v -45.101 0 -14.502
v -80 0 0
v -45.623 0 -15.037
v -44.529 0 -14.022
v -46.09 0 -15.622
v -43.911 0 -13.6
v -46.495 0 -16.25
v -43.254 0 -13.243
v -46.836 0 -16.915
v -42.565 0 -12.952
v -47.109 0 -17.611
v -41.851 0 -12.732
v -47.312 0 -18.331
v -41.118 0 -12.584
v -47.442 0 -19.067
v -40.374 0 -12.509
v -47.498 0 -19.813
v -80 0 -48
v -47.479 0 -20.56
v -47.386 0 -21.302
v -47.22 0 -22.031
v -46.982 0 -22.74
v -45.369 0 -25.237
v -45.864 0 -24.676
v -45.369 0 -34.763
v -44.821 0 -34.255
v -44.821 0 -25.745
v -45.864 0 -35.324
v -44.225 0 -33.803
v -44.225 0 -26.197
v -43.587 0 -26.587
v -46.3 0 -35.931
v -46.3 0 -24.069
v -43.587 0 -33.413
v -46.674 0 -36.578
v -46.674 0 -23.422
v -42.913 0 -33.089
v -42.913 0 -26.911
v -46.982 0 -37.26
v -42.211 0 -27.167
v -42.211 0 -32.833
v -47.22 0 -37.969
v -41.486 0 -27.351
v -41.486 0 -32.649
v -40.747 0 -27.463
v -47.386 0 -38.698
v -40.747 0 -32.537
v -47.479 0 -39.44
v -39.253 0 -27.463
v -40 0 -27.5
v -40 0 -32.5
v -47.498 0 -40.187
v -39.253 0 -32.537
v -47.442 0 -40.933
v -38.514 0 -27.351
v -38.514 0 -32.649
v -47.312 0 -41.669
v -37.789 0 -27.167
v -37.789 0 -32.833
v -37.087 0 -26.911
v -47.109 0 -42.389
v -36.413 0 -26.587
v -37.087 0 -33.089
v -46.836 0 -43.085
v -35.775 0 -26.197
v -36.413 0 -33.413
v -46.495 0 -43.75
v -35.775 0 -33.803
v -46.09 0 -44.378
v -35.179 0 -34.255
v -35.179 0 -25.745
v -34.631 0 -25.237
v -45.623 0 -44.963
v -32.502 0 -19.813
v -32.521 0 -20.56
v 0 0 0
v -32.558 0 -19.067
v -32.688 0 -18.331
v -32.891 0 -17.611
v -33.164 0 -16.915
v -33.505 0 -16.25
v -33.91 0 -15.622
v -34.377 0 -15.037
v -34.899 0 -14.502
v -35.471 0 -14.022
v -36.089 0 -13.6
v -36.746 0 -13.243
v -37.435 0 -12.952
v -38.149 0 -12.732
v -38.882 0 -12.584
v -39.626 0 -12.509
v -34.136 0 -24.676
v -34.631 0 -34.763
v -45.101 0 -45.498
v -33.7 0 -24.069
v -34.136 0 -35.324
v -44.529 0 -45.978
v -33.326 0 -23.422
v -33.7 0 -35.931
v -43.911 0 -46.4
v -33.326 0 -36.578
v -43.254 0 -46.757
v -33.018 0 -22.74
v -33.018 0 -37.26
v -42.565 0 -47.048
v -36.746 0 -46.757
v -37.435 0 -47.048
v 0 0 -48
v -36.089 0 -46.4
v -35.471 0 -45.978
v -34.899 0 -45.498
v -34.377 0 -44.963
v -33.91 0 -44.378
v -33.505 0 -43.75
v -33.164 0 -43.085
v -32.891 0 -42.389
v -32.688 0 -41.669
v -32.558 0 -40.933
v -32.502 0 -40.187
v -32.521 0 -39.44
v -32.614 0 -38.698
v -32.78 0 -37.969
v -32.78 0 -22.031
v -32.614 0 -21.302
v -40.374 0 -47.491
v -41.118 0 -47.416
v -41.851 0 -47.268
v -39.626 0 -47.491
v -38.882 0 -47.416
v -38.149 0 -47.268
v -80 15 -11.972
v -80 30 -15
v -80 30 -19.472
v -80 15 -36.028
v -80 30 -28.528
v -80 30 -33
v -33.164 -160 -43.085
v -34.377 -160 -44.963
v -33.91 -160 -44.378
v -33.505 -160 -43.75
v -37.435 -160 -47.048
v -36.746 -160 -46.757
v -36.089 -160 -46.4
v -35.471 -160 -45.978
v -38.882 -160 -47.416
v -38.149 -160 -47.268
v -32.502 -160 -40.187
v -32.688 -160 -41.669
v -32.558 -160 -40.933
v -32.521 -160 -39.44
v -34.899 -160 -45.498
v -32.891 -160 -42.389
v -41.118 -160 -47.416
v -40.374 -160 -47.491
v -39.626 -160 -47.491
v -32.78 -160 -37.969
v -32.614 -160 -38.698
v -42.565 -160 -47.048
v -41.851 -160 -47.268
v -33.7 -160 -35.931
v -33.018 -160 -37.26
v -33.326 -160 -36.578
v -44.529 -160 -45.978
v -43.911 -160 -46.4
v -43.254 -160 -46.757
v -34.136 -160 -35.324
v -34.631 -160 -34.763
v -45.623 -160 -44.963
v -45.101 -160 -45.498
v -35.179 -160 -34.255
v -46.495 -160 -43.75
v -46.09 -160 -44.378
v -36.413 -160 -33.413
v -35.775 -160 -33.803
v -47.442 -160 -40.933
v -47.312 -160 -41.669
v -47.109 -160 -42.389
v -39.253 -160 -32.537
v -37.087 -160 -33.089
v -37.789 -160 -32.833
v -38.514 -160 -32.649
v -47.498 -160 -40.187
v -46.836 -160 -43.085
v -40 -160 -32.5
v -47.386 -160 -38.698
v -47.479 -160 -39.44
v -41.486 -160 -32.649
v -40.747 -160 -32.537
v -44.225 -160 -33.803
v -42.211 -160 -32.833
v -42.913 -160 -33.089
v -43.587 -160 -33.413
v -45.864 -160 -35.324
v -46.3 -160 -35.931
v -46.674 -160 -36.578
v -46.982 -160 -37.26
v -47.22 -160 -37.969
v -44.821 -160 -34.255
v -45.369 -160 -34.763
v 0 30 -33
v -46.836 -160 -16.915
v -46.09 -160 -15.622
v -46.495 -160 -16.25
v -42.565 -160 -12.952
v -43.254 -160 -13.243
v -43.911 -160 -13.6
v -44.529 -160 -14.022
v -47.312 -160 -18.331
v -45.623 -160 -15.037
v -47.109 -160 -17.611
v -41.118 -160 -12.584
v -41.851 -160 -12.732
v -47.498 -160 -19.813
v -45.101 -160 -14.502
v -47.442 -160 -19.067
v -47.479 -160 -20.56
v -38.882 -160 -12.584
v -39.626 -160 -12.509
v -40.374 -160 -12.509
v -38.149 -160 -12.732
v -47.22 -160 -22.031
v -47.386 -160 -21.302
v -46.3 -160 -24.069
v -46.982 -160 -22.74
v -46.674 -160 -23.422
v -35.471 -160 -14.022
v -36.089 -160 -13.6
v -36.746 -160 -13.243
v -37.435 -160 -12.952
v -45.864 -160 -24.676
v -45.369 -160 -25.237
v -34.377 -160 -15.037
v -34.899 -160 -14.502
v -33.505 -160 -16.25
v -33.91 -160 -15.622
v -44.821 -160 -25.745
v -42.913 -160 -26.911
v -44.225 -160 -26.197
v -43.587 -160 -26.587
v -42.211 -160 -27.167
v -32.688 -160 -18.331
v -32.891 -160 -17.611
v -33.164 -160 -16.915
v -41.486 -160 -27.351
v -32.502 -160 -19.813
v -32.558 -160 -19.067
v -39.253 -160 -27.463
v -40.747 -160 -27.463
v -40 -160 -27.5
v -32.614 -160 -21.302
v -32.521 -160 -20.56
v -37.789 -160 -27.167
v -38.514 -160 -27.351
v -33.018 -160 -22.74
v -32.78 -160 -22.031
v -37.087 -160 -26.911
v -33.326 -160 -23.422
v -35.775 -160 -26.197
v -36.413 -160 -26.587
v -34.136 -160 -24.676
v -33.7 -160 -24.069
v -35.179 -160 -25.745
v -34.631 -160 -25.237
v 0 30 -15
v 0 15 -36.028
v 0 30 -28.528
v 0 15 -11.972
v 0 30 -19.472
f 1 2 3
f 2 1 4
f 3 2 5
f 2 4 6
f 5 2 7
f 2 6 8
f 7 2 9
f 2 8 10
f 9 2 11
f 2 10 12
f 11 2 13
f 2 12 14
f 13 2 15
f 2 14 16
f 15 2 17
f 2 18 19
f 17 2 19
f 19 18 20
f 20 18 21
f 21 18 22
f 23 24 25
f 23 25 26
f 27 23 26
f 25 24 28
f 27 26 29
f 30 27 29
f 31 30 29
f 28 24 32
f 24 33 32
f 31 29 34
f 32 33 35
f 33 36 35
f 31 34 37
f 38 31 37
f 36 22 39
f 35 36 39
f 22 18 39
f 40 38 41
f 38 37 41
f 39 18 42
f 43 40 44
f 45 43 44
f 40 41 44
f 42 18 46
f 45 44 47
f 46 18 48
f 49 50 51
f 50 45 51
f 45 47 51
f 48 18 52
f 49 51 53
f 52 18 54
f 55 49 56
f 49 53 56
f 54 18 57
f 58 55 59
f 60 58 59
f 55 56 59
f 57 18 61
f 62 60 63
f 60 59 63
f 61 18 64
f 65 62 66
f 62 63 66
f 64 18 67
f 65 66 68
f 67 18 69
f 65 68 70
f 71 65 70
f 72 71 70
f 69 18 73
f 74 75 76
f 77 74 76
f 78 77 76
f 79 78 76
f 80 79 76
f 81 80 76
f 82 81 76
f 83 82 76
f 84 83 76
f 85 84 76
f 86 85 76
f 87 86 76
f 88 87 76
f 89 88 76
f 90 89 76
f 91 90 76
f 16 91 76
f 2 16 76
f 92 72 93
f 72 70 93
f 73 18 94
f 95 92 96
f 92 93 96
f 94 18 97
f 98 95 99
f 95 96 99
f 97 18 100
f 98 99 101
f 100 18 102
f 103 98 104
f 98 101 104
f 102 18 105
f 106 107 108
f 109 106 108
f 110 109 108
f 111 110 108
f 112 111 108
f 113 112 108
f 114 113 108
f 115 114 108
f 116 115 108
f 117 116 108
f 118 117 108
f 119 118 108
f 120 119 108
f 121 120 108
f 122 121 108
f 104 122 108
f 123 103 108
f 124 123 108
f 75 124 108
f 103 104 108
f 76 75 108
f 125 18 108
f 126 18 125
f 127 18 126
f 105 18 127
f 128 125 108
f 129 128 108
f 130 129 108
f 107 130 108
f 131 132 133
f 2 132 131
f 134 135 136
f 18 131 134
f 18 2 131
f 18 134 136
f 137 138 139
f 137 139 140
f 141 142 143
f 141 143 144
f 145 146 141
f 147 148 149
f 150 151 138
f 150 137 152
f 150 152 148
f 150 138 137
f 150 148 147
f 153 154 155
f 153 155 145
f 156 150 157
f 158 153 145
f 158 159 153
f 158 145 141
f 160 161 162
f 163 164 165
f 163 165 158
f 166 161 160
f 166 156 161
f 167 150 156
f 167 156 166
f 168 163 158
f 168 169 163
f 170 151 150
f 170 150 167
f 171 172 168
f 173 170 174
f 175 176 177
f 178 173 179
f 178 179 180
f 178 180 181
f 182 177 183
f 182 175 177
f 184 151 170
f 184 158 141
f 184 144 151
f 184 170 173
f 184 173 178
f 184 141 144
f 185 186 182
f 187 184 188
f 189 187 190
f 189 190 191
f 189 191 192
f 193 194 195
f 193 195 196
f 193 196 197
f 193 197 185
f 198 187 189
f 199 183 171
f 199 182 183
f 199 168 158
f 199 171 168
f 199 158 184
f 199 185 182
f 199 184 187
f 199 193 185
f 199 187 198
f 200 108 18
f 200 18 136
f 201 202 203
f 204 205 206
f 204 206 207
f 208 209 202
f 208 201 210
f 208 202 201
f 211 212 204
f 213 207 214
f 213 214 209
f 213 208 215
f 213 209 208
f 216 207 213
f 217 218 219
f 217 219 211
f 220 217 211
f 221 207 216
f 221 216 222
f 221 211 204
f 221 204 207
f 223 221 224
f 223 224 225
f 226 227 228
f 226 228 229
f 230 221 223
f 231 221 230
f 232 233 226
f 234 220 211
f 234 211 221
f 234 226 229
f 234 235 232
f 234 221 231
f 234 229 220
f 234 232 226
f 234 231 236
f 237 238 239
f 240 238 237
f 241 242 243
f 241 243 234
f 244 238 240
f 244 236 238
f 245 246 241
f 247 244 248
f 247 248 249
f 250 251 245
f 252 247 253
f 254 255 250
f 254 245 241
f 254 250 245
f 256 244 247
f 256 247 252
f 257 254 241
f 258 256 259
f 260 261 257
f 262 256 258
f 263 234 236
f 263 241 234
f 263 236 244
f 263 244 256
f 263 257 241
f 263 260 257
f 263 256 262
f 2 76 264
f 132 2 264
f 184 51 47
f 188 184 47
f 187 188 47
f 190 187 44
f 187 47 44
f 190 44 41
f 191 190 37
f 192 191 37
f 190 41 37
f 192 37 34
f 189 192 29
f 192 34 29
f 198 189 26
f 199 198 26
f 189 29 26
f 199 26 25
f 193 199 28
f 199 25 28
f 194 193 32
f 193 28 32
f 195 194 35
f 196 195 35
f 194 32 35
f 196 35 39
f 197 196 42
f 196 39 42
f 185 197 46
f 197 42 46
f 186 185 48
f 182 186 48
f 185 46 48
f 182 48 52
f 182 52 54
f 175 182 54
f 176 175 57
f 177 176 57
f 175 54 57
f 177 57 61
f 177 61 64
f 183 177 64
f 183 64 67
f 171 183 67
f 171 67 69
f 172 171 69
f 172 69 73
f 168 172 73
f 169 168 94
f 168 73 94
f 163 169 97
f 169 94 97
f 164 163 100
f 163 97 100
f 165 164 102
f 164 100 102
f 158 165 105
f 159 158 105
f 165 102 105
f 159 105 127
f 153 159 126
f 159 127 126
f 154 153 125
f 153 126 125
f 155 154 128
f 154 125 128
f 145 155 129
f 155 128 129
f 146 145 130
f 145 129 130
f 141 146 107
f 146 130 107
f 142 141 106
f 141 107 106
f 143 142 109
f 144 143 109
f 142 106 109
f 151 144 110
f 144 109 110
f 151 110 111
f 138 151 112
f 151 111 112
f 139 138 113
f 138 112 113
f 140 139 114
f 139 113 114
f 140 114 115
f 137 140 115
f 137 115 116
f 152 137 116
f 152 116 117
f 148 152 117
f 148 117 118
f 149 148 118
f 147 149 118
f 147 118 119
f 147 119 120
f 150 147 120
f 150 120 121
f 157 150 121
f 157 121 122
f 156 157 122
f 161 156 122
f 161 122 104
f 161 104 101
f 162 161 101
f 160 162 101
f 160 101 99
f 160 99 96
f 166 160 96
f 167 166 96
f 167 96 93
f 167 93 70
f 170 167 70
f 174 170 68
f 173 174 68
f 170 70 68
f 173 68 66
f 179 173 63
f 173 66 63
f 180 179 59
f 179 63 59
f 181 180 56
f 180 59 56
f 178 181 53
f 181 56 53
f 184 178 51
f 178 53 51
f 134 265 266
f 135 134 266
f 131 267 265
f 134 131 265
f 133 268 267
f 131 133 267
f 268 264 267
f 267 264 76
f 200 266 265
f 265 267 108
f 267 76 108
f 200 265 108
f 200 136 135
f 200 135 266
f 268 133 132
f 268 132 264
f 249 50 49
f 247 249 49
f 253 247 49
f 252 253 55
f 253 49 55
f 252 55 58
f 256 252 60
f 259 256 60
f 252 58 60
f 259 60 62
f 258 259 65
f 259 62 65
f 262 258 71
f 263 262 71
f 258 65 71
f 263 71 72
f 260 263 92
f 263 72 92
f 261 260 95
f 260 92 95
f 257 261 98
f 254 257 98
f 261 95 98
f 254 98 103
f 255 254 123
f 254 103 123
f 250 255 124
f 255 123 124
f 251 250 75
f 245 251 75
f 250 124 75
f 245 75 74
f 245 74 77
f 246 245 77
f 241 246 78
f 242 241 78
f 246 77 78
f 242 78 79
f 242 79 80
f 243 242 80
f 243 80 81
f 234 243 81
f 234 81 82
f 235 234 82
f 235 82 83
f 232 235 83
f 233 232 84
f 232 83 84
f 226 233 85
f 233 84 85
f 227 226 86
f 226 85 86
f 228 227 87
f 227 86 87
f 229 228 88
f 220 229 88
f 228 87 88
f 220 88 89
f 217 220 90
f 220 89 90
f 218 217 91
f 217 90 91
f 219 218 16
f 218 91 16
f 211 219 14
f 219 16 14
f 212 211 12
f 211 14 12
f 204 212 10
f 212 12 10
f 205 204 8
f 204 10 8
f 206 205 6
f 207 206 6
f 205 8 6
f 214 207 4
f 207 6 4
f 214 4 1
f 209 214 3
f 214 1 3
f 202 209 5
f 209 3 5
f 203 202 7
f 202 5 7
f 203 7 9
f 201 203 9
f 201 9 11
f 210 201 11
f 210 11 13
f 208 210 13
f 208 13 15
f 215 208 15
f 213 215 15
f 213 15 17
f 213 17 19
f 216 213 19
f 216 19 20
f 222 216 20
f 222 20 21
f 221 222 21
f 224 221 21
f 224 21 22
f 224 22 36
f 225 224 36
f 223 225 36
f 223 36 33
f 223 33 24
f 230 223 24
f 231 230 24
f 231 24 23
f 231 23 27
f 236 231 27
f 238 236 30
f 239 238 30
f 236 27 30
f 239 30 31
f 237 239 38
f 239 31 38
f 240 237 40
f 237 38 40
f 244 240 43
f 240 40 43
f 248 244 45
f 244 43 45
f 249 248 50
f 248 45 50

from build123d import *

# Parameters (mm, degrees)
SKETCH1_W           = 80
SKETCH1_H           = 48
BOSS_EXTRUDE1_DEPTH = 30
CUT_EXTRUDE1_DEPTH  = 99
CUT_EXTRUDE2_DEPTH  = 99
SKETCH4_R           = 7.5
BOSS_EXTRUDE2_DEPTH = 160


with BuildPart() as part:
    # Sketch1 → Boss-Extrude1 (new body)
    with BuildSketch(Plane(origin=(0, 0, 0), x_dir=(1, 0, 0), z_dir=(0, 1, 0))):
        with Locations((-40, 24)):
            Rectangle(SKETCH1_W, SKETCH1_H)
    extrude(amount=BOSS_EXTRUDE1_DEPTH)

    # Sketch2 → Cut-Extrude1 (cut, through all)
    with BuildSketch(Plane(origin=(0, 0, 0), x_dir=(0, 0, -1), z_dir=(1, 0, 0))):
        Polygon((0, 0), (15, 30), (0, 30), align=None)
        Polygon((48, 0), (33, 30), (48, 30), align=None)
    extrude(amount=-CUT_EXTRUDE1_DEPTH, mode=Mode.SUBTRACT)

    # Sketch3 → Cut-Extrude2 (cut, through all)
    with BuildSketch(Plane(origin=(0, 0, 0), x_dir=(0, 0, -1), z_dir=(1, 0, 0))):
        Polygon((19.472135955, 30), (11.972135955, 15), (36.027864045, 15), (28.527864045, 30), align=None)
    extrude(amount=-CUT_EXTRUDE2_DEPTH, mode=Mode.SUBTRACT)

    # Sketch4 → Boss-Extrude2 (add)
    with BuildSketch(Plane.XZ):
        with Locations(Location((-40, -20, 0), (0, 0, 270))):
            Circle(SKETCH4_R)
        with Locations(Location((-40, -40, 0), (0, 0, 90))):
            Circle(SKETCH4_R)
    extrude(amount=BOSS_EXTRUDE2_DEPTH)


solid = part.part
